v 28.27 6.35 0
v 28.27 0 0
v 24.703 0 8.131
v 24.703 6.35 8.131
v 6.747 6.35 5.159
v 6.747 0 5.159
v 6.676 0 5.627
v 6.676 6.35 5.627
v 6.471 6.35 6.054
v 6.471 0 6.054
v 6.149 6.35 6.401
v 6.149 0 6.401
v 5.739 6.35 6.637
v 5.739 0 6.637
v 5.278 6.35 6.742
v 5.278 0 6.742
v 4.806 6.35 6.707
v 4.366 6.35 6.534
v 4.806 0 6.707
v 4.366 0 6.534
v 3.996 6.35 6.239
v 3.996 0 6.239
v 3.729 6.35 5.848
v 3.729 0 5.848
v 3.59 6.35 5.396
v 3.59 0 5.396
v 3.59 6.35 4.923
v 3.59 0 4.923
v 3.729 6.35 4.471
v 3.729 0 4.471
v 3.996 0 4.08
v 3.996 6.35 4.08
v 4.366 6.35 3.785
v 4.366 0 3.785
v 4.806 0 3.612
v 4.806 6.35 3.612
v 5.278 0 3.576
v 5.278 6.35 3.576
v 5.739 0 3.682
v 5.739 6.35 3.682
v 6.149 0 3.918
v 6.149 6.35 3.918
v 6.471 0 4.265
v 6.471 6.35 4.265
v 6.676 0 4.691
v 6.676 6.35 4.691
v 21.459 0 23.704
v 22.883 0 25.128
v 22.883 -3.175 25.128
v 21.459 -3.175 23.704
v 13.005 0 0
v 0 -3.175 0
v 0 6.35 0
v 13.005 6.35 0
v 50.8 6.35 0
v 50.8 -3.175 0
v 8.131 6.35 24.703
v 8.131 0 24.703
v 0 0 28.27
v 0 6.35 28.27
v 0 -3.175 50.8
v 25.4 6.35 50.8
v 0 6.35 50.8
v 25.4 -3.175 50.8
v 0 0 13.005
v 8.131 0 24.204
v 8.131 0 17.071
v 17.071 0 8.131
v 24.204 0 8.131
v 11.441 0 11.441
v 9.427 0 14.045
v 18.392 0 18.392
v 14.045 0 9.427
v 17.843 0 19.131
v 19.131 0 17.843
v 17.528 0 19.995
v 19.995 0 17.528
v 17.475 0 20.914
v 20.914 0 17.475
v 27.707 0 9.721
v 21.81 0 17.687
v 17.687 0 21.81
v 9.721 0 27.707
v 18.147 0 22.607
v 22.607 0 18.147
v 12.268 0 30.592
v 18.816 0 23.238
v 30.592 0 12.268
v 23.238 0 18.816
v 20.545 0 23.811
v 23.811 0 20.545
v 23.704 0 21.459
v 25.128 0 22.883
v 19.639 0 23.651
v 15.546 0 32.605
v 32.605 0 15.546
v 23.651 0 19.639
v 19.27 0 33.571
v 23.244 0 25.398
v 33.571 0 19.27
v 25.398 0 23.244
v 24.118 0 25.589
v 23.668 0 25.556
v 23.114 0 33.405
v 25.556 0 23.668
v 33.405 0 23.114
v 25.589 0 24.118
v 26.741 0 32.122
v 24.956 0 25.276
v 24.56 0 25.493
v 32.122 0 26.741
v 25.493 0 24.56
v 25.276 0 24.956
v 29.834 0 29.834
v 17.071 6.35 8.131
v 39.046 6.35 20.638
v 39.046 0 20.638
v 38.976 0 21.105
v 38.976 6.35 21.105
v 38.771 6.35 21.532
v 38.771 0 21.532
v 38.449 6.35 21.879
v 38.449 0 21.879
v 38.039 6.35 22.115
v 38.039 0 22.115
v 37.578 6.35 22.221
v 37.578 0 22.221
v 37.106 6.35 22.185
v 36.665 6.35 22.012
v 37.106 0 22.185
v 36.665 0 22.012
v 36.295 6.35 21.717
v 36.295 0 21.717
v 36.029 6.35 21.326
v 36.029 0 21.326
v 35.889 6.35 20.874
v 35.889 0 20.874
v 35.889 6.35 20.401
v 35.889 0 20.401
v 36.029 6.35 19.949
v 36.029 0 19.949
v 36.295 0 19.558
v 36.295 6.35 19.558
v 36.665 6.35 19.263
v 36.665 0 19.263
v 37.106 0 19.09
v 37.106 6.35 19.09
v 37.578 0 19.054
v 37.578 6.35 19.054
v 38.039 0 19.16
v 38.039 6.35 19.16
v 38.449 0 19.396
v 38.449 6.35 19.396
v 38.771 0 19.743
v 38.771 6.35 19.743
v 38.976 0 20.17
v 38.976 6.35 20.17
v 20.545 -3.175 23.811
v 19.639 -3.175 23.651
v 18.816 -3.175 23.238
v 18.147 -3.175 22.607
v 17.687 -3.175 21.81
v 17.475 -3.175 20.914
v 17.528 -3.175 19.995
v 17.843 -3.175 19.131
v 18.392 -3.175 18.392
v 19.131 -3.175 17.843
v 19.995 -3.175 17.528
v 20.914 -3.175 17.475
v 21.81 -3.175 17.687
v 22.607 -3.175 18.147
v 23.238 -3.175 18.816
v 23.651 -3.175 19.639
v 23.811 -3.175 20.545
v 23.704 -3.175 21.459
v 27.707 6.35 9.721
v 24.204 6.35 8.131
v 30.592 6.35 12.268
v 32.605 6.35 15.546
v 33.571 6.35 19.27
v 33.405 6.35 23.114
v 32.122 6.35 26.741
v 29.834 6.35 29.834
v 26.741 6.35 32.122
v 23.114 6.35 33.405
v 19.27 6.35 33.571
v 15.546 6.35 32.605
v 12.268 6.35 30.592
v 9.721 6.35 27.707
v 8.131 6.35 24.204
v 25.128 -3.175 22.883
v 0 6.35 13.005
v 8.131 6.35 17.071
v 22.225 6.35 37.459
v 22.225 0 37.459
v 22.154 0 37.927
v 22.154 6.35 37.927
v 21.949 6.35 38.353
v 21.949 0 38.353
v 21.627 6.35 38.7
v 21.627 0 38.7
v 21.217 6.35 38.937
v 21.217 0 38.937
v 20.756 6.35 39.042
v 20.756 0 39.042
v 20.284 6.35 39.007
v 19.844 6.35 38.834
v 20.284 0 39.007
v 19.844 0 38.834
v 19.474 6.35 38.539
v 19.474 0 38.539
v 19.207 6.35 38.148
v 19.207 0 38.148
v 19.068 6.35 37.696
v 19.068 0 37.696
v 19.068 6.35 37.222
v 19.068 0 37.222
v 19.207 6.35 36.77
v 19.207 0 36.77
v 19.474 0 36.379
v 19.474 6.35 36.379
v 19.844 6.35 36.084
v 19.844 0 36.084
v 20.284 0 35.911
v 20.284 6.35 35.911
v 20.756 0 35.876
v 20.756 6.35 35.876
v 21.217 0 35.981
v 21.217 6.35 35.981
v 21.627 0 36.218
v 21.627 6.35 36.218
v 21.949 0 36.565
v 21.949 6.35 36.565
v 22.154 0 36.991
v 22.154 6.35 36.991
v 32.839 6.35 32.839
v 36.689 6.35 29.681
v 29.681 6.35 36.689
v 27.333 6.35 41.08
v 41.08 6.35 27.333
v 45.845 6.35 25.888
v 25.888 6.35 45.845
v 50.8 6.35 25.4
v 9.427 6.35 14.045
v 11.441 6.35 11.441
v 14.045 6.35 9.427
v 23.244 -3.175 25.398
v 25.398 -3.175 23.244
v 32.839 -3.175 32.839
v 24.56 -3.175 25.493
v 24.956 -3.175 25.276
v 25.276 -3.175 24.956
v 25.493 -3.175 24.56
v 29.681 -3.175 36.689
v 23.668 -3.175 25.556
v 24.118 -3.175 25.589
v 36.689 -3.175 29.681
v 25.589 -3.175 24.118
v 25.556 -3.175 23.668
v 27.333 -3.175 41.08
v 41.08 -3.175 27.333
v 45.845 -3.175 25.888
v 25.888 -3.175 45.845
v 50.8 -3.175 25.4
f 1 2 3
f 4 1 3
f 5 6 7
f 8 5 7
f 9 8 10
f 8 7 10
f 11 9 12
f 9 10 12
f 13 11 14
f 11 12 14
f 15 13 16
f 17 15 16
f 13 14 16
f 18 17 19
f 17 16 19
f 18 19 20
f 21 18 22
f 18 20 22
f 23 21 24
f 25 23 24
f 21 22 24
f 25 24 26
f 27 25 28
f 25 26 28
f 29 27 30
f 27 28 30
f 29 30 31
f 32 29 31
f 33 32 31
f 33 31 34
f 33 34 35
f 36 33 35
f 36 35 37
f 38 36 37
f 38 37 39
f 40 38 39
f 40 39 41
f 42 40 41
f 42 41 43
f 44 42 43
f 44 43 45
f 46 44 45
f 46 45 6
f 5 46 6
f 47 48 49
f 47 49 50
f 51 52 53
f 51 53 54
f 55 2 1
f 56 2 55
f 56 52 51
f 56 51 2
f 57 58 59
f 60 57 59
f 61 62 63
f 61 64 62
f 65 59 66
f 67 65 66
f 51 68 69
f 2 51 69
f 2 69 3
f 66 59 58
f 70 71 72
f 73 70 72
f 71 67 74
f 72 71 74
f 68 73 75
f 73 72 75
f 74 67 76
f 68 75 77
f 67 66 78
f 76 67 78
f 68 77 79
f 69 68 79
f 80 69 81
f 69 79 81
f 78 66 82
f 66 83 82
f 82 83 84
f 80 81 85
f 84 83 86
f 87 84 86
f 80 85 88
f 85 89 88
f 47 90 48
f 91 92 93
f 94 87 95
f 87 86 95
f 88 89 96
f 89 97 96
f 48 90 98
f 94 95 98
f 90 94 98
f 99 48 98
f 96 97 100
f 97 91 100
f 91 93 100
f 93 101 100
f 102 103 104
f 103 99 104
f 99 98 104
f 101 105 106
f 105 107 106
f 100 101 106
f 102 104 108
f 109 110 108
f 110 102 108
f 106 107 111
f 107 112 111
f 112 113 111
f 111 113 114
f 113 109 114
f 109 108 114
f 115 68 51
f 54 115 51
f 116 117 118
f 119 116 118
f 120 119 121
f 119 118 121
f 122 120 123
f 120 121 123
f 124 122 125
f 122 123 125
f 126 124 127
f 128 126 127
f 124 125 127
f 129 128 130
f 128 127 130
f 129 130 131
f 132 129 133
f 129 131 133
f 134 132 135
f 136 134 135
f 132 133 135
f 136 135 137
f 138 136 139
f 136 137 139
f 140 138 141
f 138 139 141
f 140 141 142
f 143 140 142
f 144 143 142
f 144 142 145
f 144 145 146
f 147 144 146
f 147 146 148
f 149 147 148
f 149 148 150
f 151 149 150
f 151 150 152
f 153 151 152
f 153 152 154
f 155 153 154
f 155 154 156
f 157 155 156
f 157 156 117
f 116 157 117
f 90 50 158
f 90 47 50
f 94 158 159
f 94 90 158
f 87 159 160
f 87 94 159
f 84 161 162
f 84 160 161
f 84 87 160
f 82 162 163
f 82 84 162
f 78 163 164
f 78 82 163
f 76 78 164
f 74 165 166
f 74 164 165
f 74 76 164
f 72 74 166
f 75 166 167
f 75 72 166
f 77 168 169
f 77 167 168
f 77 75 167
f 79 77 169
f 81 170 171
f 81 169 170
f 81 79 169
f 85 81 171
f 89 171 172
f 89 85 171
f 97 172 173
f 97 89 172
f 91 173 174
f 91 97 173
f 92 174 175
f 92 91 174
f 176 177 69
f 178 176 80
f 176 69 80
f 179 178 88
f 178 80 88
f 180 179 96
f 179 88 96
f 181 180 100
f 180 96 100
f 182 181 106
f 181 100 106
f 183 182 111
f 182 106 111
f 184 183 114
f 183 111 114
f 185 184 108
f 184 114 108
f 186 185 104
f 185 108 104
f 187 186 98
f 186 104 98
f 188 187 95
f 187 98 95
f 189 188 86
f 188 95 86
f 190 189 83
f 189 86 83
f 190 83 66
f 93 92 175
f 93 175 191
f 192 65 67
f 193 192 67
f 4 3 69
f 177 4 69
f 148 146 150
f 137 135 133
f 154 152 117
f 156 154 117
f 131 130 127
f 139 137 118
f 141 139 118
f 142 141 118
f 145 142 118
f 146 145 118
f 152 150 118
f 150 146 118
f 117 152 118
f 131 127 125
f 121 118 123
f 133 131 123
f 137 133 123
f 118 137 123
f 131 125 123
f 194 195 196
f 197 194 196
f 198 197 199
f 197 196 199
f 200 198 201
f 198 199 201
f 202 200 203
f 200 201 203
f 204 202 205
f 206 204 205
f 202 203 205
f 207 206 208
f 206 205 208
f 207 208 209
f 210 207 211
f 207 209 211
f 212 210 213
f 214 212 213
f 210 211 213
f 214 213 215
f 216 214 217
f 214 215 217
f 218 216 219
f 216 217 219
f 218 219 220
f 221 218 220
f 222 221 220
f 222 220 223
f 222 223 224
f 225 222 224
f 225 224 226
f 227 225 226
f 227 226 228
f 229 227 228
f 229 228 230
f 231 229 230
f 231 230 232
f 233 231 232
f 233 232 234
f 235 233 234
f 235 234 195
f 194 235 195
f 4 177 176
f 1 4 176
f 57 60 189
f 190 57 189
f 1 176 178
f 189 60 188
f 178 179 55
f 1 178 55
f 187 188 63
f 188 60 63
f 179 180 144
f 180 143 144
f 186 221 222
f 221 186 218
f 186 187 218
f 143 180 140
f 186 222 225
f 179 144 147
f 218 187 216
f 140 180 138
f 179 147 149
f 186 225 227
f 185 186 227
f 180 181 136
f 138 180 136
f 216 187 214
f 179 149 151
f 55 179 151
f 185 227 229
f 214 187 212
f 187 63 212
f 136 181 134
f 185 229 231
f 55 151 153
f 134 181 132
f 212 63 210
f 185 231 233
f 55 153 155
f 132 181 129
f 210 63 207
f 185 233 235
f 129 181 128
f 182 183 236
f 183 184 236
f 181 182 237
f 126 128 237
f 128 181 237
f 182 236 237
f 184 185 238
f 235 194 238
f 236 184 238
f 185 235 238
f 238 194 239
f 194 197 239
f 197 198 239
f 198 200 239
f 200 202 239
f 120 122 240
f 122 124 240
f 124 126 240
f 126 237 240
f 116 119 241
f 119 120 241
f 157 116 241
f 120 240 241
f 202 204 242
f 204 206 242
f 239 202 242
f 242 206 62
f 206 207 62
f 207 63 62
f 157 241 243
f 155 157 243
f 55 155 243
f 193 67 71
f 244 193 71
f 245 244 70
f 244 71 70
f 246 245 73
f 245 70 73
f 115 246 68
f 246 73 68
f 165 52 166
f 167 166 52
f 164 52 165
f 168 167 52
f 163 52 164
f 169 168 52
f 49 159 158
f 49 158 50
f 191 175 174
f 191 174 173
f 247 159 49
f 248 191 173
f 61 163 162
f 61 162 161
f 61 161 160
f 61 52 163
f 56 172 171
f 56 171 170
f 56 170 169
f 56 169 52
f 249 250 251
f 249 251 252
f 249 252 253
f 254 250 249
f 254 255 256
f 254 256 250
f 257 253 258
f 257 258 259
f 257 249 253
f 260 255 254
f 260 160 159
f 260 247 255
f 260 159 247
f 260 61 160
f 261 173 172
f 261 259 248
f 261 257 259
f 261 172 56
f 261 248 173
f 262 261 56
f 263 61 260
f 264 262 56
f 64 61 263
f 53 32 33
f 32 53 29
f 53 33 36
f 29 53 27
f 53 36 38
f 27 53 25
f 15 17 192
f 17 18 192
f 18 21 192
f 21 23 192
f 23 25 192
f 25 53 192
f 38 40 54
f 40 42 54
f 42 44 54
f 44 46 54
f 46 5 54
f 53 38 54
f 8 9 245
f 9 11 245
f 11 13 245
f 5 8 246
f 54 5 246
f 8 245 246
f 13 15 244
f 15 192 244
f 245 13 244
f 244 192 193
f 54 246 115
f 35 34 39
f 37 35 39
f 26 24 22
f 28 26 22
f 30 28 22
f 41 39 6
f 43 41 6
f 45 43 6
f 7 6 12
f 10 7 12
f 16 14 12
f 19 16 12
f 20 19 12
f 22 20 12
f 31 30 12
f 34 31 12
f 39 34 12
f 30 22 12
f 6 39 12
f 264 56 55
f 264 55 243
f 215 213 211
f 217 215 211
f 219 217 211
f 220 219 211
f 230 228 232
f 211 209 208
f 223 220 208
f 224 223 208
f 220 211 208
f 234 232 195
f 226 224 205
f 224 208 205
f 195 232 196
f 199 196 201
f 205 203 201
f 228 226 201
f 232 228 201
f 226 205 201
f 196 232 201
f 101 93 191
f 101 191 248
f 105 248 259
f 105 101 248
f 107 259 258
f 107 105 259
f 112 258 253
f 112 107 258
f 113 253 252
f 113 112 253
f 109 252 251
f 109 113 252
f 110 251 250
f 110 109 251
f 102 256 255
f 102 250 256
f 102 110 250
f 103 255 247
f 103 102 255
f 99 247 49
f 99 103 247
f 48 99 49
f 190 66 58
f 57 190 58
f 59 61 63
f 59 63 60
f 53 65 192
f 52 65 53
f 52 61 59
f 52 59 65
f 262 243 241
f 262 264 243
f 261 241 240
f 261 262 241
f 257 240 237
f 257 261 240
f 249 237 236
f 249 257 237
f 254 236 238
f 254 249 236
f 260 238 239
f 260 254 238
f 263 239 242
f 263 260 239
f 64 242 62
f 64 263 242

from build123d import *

# Parameters (mm, degrees)
F9_DEPTH      = 3.175
F9_DEPTH_BACK = 6.35
F7_R          = 3.175
F10_DEPTH     = 3.176
F3_R          = 13.0054161967
F4_R          = 1.5875
F11_DEPTH     = 6.351


# Not quite as in the source:
# - a variable given as a bare number and used for a length is read in inches; the dataset says mm whatever the document's units were


with BuildPart() as f9:
    # F1 (on Front) → F9 (new body, two sides)
    with BuildSketch(Plane.XZ) as f9_sk:
        with BuildLine():
            Line((0, 50.8), (0, 0))
            Line((0, 0), (50.8, 0))
            Line((50.8, 0), (50.8, 25.4))
            ThreePointArc((50.8, 25.4), (32.8394877579, 32.8394877579), (25.4, 50.8))
            Line((25.4, 50.8), (0, 50.8))
        make_face()
    extrude(amount=F9_DEPTH)
    extrude(f9_sk.sketch, amount=-F9_DEPTH_BACK)

    # F8 (on Front) + F7 (on Front) → F10 (cut, through all)
    with BuildSketch(Plane.XZ):
        with BuildLine():
            Line((22.8825640303, 25.1276280605), (21.4592504682, 23.7043144985))
            Line((21.4592504682, 23.7043144985), (23.7043144985, 21.4592504682))
            Line((23.7043144985, 21.4592504682), (25.1276280605, 22.8825640303))
            ThreePointArc((25.1276280605, 22.8825640303), (25.1276280605, 25.1276280605), (22.8825640303, 25.1276280605))
        make_face()
    with BuildSketch(Plane.XZ):
        with Locations((20.6375, 20.6375)):
            Circle(F7_R)
    extrude(amount=F10_DEPTH, mode=Mode.SUBTRACT)

    # F3 (on Front) + F4 (on Front) + F6 (on face) → F11 (cut, through all)
    with BuildSketch(Plane.XZ):
        with Locations((20.6375, 20.6375)):
            Circle(F3_R)
    with BuildSketch(Plane.XZ):
        with Locations((37.4589580984, 20.6375)):
            Circle(F4_R)
        with Locations((20.6375, 37.4589580984)):
            Circle(F4_R)
        with Locations((5.159375, 5.159375)):
            Circle(F4_R)
    with BuildSketch(Plane.XZ):
        Polygon((17.0707799442, 8.1307274949), (13.0054161967, 0), (28.2695838033, 0), (24.7028637475, 8.1307274949), align=None)
        Polygon((8.1307274949, 24.7028637475), (0, 28.2695838033), (0, 13.0054161967), (8.1307274949, 17.0707799442), align=None)
    extrude(amount=-F11_DEPTH, mode=Mode.SUBTRACT)


solid = f9.part
